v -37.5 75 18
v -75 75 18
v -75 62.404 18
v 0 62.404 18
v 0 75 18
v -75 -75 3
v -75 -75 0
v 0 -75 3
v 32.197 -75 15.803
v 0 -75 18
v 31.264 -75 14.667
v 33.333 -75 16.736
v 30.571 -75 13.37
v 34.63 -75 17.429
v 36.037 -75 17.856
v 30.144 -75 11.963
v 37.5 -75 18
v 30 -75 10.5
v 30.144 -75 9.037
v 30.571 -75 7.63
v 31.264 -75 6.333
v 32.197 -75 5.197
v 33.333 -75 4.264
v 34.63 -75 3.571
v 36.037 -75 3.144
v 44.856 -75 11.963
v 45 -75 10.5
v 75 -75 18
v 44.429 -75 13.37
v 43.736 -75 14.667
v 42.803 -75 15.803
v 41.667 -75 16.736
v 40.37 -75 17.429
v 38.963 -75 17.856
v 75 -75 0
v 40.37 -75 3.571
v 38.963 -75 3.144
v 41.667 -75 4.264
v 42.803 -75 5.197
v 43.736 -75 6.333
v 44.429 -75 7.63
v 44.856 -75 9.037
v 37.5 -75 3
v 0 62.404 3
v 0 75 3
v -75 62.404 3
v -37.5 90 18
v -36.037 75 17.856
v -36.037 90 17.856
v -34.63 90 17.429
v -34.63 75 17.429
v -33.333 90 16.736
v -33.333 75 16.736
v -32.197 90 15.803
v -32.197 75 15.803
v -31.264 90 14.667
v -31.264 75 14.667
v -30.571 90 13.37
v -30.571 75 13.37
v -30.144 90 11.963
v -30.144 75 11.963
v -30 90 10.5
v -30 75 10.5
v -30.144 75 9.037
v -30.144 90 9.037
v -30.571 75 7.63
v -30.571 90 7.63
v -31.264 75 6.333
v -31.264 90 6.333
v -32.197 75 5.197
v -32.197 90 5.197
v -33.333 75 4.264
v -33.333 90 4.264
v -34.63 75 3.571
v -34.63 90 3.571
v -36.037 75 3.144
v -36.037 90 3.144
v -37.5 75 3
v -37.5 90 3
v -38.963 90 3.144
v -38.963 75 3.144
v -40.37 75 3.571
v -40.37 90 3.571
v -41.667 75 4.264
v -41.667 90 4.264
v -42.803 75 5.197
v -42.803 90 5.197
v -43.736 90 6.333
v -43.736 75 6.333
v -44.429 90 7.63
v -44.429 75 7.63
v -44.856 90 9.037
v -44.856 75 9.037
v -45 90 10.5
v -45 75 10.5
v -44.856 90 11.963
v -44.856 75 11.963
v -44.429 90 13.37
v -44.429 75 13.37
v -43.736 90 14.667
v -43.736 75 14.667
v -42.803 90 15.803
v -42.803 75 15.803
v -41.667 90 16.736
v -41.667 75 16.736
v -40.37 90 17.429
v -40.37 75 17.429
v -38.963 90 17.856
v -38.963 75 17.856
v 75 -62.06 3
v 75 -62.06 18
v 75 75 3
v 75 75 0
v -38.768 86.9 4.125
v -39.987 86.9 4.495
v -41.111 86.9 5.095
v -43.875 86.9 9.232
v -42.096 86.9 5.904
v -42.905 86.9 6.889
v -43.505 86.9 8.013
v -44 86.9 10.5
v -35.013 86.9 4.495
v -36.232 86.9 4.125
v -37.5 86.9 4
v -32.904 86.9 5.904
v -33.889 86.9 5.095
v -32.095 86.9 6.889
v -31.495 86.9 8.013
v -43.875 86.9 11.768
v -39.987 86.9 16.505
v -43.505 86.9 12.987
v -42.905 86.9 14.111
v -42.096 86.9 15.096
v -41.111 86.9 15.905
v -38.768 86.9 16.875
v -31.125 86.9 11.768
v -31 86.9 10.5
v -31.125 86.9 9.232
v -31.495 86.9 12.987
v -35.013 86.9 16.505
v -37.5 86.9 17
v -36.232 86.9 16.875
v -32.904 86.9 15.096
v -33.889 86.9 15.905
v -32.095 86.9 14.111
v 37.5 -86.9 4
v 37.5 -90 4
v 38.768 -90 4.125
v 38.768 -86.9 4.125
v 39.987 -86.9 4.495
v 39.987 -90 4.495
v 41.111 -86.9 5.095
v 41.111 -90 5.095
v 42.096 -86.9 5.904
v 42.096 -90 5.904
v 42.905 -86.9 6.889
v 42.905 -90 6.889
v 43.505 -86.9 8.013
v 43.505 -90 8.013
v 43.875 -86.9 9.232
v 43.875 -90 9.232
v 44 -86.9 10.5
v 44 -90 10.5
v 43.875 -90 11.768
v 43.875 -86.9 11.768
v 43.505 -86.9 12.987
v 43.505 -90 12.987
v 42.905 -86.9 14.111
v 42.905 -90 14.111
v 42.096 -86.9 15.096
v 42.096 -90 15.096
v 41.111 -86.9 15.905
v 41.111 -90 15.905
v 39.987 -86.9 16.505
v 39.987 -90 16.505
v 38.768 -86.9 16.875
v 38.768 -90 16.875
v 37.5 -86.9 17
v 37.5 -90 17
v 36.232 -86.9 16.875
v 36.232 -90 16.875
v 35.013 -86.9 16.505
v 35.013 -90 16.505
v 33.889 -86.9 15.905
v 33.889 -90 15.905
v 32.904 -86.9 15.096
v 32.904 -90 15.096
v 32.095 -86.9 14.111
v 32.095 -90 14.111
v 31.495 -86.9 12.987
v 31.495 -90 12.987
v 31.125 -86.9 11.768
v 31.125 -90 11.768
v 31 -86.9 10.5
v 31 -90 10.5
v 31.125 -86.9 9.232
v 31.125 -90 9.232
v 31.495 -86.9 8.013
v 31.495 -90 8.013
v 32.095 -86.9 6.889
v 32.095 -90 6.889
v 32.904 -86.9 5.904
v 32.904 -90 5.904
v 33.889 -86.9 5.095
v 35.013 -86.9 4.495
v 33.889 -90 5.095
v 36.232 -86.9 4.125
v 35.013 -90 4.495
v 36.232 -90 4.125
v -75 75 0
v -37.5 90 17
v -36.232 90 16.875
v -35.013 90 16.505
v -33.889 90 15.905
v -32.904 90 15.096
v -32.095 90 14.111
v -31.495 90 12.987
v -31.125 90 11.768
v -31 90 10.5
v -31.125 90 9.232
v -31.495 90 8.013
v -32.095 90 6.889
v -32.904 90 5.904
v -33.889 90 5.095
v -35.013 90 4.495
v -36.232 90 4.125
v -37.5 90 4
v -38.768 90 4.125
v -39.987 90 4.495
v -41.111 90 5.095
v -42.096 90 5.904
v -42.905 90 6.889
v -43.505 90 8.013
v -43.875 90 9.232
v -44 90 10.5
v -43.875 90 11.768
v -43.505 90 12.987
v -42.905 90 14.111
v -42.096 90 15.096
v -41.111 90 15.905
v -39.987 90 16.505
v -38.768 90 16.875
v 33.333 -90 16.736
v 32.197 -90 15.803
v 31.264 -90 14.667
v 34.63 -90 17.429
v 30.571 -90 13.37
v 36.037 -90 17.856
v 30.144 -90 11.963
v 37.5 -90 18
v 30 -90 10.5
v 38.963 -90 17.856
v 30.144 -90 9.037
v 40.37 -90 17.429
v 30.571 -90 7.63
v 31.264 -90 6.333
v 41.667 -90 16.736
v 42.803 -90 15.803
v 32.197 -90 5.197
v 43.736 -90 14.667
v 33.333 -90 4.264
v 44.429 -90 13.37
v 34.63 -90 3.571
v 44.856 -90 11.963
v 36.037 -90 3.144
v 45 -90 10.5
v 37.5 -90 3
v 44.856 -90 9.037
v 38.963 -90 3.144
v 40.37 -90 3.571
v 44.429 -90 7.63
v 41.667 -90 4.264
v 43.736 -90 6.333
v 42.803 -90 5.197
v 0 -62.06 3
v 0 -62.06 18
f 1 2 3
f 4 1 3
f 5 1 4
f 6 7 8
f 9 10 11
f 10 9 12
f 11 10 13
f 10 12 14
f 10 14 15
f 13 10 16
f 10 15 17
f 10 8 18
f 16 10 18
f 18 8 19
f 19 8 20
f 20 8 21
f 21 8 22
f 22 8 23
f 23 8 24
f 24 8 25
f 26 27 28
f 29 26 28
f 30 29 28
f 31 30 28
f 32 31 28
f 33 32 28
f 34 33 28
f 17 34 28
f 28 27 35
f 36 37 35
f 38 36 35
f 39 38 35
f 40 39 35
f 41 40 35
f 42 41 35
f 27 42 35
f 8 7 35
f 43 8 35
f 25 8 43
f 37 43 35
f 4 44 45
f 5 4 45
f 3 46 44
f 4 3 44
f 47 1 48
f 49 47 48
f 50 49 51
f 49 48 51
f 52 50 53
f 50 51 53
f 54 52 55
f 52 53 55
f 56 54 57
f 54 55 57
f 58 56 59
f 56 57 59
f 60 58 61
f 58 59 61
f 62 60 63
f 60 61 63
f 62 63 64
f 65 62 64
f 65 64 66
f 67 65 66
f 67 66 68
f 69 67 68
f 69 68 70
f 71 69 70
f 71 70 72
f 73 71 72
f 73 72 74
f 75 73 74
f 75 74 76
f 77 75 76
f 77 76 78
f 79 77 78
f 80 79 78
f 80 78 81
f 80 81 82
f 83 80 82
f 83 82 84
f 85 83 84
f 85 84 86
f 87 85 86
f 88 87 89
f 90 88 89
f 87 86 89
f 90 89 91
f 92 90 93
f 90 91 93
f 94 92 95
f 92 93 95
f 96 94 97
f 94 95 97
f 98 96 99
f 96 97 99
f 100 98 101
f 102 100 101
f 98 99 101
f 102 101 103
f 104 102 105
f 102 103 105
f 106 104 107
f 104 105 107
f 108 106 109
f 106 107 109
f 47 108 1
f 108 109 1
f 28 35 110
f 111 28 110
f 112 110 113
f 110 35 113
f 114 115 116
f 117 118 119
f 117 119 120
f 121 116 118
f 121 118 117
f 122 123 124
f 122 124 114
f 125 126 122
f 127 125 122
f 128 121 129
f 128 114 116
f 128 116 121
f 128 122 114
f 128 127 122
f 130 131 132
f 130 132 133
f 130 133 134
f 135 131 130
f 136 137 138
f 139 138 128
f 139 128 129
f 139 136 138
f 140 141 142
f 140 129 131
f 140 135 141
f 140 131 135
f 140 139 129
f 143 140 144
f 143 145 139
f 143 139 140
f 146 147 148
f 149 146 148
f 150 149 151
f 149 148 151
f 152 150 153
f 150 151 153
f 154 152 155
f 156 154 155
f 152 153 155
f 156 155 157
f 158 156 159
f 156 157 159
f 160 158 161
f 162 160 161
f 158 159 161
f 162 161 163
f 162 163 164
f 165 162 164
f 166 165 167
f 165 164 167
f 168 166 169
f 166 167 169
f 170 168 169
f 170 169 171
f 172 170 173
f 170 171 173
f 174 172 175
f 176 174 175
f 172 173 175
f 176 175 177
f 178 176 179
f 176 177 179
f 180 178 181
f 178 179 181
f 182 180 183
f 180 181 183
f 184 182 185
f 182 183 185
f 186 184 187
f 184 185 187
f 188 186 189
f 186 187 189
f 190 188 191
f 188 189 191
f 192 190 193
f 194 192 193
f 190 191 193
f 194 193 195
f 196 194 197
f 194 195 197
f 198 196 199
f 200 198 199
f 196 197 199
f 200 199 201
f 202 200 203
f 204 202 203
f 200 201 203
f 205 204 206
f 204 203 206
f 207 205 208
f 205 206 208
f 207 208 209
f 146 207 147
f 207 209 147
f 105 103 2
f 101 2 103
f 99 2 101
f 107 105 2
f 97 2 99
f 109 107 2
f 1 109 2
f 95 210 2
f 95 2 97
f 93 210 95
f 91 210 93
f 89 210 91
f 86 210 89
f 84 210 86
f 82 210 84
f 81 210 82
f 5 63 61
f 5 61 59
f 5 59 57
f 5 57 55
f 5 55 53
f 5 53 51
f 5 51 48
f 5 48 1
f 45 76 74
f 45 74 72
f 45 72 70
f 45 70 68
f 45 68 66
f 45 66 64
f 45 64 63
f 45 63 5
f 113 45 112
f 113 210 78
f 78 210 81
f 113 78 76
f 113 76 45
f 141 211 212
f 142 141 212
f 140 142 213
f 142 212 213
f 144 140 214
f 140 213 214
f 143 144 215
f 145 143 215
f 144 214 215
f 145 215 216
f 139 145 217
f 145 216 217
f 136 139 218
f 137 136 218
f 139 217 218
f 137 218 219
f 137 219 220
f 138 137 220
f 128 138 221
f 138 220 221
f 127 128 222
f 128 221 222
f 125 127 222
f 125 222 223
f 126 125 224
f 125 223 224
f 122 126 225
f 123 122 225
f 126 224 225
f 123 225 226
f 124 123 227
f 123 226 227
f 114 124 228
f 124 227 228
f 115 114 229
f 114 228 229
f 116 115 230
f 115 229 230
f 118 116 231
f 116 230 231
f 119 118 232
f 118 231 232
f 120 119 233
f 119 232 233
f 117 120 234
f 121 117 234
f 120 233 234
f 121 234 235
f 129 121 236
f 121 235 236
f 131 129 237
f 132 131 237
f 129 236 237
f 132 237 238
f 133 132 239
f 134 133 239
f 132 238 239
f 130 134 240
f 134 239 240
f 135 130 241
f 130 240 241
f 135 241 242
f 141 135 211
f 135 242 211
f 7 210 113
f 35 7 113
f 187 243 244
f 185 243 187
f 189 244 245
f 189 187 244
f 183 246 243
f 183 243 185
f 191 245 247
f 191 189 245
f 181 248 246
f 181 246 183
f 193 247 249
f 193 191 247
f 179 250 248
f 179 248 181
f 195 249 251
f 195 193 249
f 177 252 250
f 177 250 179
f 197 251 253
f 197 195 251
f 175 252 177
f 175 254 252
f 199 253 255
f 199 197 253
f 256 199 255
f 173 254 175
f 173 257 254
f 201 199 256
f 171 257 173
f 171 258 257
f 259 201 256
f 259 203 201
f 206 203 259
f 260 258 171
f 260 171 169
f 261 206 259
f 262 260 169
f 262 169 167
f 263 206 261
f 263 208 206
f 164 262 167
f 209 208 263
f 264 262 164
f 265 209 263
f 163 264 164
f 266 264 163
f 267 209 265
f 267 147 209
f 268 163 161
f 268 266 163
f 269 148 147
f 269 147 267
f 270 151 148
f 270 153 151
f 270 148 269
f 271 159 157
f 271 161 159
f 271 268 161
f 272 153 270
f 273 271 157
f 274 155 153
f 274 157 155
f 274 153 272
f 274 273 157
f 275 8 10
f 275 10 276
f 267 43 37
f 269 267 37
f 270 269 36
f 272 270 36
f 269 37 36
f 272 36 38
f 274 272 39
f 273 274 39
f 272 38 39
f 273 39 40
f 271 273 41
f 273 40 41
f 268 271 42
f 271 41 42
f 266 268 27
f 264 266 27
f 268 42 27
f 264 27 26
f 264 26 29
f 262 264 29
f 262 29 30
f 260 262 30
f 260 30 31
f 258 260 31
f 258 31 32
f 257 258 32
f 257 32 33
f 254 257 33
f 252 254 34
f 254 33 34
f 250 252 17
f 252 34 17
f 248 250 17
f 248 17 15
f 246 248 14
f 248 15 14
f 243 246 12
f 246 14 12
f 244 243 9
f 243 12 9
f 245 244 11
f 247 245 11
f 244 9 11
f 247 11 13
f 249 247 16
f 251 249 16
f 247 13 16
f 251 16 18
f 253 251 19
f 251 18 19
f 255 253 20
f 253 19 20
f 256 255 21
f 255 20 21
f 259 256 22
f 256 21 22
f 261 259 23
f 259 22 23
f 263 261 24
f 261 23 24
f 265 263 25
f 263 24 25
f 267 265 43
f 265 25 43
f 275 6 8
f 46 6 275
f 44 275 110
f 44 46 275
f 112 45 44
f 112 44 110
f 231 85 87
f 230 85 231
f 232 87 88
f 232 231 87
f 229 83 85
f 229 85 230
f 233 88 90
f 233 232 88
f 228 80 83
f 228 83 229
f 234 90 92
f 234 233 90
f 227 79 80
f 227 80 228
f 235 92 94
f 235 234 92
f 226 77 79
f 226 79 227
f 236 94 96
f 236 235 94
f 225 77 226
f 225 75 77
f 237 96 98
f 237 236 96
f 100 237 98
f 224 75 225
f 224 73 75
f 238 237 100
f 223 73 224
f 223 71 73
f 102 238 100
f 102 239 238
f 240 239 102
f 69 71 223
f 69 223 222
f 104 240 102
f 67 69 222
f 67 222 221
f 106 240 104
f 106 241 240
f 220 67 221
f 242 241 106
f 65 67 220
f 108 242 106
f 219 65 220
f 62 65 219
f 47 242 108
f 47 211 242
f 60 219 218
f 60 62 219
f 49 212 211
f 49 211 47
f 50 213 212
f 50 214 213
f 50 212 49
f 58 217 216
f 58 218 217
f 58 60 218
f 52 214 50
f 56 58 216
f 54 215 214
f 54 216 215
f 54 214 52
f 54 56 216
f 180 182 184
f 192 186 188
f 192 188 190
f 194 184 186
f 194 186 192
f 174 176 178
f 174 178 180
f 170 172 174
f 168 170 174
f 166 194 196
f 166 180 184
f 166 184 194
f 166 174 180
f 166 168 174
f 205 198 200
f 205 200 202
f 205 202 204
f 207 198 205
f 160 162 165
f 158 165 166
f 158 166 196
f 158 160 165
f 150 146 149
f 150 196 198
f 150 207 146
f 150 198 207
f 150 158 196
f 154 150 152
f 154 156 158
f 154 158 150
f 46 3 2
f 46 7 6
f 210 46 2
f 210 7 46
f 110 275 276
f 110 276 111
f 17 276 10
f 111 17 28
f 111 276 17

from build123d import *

# Parameters (mm, degrees)
SKETCH1_W           = 150
SKETCH1_H           = 150
BOSS_EXTRUDE1_DEPTH = 3
SKETCH2_R           = 7.5
BOSS_EXTRUDE2_DEPTH = 15
SKETCH4_R           = 7.5
BOSS_EXTRUDE3_DEPTH = 15
SKETCH8_R           = 6.5
CUT_EXTRUDE1_DEPTH  = 3.1
SKETCH9_R           = 6.5
CUT_EXTRUDE2_DEPTH  = 3.1
SKETCH10_W          = 75
SKETCH10_H          = 12.59609842
SKETCH10_H_2        = 12.940455582
BOSS_EXTRUDE4_DEPTH = 15


with BuildPart() as part:
    # Sketch1 → Boss-Extrude1 (new body)
    with BuildSketch(Plane.XY):
        Rectangle(SKETCH1_W, SKETCH1_H)
    extrude(amount=BOSS_EXTRUDE1_DEPTH)



with BuildPart() as body_2:
    # Sketch2 → Boss-Extrude2 (new body)
    with BuildSketch(Plane.XZ.offset(75)):
        with Locations(Location((37.5, 10.5, 0), (0, 0, 270))):
            Circle(SKETCH2_R)
    extrude(amount=BOSS_EXTRUDE2_DEPTH)

    # Sketch8 → Cut-Extrude1 (cut)
    with BuildSketch(Plane.XZ.offset(90)):
        with Locations(Location((37.5, 10.5, 0), (0, 0, 270))):
            Circle(SKETCH8_R)
    extrude(amount=-CUT_EXTRUDE1_DEPTH, mode=Mode.SUBTRACT)


with BuildPart() as body_3:
    # Sketch4 → Boss-Extrude3 (new body)
    with BuildSketch(Plane(origin=(0, 75, 0), x_dir=(1, 0, 0), z_dir=(0, 1, 0))):
        with Locations(Location((-37.5, -10.5, 0), (0, 0, 270))):
            Circle(SKETCH4_R)
    extrude(amount=BOSS_EXTRUDE3_DEPTH)

    # Sketch9 → Cut-Extrude2 (cut)
    with BuildSketch(Plane(origin=(0, 90, 0), x_dir=(1, 0, 0), z_dir=(0, 1, 0))):
        with Locations(Location((-37.5, -10.5, 0), (0, 0, 270))):
            Circle(SKETCH9_R)
    extrude(amount=-CUT_EXTRUDE2_DEPTH, mode=Mode.SUBTRACT)


with BuildPart() as part_1:
    add(part.part)

    add(body_2.part)  # Boss-Extrude4 merges body 2

    add(body_3.part)  # Boss-Extrude4 merges body 3
    # Sketch10 → Boss-Extrude4 (add)
    with BuildSketch(Plane.XY.offset(3)):
        with Locations((-37.5, 68.70195079)):
            Rectangle(SKETCH10_W, SKETCH10_H)
        with Locations((37.5, -68.529772209)):
            Rectangle(SKETCH10_W, SKETCH10_H_2)
    extrude(amount=BOSS_EXTRUDE4_DEPTH)


solid = part_1.part
